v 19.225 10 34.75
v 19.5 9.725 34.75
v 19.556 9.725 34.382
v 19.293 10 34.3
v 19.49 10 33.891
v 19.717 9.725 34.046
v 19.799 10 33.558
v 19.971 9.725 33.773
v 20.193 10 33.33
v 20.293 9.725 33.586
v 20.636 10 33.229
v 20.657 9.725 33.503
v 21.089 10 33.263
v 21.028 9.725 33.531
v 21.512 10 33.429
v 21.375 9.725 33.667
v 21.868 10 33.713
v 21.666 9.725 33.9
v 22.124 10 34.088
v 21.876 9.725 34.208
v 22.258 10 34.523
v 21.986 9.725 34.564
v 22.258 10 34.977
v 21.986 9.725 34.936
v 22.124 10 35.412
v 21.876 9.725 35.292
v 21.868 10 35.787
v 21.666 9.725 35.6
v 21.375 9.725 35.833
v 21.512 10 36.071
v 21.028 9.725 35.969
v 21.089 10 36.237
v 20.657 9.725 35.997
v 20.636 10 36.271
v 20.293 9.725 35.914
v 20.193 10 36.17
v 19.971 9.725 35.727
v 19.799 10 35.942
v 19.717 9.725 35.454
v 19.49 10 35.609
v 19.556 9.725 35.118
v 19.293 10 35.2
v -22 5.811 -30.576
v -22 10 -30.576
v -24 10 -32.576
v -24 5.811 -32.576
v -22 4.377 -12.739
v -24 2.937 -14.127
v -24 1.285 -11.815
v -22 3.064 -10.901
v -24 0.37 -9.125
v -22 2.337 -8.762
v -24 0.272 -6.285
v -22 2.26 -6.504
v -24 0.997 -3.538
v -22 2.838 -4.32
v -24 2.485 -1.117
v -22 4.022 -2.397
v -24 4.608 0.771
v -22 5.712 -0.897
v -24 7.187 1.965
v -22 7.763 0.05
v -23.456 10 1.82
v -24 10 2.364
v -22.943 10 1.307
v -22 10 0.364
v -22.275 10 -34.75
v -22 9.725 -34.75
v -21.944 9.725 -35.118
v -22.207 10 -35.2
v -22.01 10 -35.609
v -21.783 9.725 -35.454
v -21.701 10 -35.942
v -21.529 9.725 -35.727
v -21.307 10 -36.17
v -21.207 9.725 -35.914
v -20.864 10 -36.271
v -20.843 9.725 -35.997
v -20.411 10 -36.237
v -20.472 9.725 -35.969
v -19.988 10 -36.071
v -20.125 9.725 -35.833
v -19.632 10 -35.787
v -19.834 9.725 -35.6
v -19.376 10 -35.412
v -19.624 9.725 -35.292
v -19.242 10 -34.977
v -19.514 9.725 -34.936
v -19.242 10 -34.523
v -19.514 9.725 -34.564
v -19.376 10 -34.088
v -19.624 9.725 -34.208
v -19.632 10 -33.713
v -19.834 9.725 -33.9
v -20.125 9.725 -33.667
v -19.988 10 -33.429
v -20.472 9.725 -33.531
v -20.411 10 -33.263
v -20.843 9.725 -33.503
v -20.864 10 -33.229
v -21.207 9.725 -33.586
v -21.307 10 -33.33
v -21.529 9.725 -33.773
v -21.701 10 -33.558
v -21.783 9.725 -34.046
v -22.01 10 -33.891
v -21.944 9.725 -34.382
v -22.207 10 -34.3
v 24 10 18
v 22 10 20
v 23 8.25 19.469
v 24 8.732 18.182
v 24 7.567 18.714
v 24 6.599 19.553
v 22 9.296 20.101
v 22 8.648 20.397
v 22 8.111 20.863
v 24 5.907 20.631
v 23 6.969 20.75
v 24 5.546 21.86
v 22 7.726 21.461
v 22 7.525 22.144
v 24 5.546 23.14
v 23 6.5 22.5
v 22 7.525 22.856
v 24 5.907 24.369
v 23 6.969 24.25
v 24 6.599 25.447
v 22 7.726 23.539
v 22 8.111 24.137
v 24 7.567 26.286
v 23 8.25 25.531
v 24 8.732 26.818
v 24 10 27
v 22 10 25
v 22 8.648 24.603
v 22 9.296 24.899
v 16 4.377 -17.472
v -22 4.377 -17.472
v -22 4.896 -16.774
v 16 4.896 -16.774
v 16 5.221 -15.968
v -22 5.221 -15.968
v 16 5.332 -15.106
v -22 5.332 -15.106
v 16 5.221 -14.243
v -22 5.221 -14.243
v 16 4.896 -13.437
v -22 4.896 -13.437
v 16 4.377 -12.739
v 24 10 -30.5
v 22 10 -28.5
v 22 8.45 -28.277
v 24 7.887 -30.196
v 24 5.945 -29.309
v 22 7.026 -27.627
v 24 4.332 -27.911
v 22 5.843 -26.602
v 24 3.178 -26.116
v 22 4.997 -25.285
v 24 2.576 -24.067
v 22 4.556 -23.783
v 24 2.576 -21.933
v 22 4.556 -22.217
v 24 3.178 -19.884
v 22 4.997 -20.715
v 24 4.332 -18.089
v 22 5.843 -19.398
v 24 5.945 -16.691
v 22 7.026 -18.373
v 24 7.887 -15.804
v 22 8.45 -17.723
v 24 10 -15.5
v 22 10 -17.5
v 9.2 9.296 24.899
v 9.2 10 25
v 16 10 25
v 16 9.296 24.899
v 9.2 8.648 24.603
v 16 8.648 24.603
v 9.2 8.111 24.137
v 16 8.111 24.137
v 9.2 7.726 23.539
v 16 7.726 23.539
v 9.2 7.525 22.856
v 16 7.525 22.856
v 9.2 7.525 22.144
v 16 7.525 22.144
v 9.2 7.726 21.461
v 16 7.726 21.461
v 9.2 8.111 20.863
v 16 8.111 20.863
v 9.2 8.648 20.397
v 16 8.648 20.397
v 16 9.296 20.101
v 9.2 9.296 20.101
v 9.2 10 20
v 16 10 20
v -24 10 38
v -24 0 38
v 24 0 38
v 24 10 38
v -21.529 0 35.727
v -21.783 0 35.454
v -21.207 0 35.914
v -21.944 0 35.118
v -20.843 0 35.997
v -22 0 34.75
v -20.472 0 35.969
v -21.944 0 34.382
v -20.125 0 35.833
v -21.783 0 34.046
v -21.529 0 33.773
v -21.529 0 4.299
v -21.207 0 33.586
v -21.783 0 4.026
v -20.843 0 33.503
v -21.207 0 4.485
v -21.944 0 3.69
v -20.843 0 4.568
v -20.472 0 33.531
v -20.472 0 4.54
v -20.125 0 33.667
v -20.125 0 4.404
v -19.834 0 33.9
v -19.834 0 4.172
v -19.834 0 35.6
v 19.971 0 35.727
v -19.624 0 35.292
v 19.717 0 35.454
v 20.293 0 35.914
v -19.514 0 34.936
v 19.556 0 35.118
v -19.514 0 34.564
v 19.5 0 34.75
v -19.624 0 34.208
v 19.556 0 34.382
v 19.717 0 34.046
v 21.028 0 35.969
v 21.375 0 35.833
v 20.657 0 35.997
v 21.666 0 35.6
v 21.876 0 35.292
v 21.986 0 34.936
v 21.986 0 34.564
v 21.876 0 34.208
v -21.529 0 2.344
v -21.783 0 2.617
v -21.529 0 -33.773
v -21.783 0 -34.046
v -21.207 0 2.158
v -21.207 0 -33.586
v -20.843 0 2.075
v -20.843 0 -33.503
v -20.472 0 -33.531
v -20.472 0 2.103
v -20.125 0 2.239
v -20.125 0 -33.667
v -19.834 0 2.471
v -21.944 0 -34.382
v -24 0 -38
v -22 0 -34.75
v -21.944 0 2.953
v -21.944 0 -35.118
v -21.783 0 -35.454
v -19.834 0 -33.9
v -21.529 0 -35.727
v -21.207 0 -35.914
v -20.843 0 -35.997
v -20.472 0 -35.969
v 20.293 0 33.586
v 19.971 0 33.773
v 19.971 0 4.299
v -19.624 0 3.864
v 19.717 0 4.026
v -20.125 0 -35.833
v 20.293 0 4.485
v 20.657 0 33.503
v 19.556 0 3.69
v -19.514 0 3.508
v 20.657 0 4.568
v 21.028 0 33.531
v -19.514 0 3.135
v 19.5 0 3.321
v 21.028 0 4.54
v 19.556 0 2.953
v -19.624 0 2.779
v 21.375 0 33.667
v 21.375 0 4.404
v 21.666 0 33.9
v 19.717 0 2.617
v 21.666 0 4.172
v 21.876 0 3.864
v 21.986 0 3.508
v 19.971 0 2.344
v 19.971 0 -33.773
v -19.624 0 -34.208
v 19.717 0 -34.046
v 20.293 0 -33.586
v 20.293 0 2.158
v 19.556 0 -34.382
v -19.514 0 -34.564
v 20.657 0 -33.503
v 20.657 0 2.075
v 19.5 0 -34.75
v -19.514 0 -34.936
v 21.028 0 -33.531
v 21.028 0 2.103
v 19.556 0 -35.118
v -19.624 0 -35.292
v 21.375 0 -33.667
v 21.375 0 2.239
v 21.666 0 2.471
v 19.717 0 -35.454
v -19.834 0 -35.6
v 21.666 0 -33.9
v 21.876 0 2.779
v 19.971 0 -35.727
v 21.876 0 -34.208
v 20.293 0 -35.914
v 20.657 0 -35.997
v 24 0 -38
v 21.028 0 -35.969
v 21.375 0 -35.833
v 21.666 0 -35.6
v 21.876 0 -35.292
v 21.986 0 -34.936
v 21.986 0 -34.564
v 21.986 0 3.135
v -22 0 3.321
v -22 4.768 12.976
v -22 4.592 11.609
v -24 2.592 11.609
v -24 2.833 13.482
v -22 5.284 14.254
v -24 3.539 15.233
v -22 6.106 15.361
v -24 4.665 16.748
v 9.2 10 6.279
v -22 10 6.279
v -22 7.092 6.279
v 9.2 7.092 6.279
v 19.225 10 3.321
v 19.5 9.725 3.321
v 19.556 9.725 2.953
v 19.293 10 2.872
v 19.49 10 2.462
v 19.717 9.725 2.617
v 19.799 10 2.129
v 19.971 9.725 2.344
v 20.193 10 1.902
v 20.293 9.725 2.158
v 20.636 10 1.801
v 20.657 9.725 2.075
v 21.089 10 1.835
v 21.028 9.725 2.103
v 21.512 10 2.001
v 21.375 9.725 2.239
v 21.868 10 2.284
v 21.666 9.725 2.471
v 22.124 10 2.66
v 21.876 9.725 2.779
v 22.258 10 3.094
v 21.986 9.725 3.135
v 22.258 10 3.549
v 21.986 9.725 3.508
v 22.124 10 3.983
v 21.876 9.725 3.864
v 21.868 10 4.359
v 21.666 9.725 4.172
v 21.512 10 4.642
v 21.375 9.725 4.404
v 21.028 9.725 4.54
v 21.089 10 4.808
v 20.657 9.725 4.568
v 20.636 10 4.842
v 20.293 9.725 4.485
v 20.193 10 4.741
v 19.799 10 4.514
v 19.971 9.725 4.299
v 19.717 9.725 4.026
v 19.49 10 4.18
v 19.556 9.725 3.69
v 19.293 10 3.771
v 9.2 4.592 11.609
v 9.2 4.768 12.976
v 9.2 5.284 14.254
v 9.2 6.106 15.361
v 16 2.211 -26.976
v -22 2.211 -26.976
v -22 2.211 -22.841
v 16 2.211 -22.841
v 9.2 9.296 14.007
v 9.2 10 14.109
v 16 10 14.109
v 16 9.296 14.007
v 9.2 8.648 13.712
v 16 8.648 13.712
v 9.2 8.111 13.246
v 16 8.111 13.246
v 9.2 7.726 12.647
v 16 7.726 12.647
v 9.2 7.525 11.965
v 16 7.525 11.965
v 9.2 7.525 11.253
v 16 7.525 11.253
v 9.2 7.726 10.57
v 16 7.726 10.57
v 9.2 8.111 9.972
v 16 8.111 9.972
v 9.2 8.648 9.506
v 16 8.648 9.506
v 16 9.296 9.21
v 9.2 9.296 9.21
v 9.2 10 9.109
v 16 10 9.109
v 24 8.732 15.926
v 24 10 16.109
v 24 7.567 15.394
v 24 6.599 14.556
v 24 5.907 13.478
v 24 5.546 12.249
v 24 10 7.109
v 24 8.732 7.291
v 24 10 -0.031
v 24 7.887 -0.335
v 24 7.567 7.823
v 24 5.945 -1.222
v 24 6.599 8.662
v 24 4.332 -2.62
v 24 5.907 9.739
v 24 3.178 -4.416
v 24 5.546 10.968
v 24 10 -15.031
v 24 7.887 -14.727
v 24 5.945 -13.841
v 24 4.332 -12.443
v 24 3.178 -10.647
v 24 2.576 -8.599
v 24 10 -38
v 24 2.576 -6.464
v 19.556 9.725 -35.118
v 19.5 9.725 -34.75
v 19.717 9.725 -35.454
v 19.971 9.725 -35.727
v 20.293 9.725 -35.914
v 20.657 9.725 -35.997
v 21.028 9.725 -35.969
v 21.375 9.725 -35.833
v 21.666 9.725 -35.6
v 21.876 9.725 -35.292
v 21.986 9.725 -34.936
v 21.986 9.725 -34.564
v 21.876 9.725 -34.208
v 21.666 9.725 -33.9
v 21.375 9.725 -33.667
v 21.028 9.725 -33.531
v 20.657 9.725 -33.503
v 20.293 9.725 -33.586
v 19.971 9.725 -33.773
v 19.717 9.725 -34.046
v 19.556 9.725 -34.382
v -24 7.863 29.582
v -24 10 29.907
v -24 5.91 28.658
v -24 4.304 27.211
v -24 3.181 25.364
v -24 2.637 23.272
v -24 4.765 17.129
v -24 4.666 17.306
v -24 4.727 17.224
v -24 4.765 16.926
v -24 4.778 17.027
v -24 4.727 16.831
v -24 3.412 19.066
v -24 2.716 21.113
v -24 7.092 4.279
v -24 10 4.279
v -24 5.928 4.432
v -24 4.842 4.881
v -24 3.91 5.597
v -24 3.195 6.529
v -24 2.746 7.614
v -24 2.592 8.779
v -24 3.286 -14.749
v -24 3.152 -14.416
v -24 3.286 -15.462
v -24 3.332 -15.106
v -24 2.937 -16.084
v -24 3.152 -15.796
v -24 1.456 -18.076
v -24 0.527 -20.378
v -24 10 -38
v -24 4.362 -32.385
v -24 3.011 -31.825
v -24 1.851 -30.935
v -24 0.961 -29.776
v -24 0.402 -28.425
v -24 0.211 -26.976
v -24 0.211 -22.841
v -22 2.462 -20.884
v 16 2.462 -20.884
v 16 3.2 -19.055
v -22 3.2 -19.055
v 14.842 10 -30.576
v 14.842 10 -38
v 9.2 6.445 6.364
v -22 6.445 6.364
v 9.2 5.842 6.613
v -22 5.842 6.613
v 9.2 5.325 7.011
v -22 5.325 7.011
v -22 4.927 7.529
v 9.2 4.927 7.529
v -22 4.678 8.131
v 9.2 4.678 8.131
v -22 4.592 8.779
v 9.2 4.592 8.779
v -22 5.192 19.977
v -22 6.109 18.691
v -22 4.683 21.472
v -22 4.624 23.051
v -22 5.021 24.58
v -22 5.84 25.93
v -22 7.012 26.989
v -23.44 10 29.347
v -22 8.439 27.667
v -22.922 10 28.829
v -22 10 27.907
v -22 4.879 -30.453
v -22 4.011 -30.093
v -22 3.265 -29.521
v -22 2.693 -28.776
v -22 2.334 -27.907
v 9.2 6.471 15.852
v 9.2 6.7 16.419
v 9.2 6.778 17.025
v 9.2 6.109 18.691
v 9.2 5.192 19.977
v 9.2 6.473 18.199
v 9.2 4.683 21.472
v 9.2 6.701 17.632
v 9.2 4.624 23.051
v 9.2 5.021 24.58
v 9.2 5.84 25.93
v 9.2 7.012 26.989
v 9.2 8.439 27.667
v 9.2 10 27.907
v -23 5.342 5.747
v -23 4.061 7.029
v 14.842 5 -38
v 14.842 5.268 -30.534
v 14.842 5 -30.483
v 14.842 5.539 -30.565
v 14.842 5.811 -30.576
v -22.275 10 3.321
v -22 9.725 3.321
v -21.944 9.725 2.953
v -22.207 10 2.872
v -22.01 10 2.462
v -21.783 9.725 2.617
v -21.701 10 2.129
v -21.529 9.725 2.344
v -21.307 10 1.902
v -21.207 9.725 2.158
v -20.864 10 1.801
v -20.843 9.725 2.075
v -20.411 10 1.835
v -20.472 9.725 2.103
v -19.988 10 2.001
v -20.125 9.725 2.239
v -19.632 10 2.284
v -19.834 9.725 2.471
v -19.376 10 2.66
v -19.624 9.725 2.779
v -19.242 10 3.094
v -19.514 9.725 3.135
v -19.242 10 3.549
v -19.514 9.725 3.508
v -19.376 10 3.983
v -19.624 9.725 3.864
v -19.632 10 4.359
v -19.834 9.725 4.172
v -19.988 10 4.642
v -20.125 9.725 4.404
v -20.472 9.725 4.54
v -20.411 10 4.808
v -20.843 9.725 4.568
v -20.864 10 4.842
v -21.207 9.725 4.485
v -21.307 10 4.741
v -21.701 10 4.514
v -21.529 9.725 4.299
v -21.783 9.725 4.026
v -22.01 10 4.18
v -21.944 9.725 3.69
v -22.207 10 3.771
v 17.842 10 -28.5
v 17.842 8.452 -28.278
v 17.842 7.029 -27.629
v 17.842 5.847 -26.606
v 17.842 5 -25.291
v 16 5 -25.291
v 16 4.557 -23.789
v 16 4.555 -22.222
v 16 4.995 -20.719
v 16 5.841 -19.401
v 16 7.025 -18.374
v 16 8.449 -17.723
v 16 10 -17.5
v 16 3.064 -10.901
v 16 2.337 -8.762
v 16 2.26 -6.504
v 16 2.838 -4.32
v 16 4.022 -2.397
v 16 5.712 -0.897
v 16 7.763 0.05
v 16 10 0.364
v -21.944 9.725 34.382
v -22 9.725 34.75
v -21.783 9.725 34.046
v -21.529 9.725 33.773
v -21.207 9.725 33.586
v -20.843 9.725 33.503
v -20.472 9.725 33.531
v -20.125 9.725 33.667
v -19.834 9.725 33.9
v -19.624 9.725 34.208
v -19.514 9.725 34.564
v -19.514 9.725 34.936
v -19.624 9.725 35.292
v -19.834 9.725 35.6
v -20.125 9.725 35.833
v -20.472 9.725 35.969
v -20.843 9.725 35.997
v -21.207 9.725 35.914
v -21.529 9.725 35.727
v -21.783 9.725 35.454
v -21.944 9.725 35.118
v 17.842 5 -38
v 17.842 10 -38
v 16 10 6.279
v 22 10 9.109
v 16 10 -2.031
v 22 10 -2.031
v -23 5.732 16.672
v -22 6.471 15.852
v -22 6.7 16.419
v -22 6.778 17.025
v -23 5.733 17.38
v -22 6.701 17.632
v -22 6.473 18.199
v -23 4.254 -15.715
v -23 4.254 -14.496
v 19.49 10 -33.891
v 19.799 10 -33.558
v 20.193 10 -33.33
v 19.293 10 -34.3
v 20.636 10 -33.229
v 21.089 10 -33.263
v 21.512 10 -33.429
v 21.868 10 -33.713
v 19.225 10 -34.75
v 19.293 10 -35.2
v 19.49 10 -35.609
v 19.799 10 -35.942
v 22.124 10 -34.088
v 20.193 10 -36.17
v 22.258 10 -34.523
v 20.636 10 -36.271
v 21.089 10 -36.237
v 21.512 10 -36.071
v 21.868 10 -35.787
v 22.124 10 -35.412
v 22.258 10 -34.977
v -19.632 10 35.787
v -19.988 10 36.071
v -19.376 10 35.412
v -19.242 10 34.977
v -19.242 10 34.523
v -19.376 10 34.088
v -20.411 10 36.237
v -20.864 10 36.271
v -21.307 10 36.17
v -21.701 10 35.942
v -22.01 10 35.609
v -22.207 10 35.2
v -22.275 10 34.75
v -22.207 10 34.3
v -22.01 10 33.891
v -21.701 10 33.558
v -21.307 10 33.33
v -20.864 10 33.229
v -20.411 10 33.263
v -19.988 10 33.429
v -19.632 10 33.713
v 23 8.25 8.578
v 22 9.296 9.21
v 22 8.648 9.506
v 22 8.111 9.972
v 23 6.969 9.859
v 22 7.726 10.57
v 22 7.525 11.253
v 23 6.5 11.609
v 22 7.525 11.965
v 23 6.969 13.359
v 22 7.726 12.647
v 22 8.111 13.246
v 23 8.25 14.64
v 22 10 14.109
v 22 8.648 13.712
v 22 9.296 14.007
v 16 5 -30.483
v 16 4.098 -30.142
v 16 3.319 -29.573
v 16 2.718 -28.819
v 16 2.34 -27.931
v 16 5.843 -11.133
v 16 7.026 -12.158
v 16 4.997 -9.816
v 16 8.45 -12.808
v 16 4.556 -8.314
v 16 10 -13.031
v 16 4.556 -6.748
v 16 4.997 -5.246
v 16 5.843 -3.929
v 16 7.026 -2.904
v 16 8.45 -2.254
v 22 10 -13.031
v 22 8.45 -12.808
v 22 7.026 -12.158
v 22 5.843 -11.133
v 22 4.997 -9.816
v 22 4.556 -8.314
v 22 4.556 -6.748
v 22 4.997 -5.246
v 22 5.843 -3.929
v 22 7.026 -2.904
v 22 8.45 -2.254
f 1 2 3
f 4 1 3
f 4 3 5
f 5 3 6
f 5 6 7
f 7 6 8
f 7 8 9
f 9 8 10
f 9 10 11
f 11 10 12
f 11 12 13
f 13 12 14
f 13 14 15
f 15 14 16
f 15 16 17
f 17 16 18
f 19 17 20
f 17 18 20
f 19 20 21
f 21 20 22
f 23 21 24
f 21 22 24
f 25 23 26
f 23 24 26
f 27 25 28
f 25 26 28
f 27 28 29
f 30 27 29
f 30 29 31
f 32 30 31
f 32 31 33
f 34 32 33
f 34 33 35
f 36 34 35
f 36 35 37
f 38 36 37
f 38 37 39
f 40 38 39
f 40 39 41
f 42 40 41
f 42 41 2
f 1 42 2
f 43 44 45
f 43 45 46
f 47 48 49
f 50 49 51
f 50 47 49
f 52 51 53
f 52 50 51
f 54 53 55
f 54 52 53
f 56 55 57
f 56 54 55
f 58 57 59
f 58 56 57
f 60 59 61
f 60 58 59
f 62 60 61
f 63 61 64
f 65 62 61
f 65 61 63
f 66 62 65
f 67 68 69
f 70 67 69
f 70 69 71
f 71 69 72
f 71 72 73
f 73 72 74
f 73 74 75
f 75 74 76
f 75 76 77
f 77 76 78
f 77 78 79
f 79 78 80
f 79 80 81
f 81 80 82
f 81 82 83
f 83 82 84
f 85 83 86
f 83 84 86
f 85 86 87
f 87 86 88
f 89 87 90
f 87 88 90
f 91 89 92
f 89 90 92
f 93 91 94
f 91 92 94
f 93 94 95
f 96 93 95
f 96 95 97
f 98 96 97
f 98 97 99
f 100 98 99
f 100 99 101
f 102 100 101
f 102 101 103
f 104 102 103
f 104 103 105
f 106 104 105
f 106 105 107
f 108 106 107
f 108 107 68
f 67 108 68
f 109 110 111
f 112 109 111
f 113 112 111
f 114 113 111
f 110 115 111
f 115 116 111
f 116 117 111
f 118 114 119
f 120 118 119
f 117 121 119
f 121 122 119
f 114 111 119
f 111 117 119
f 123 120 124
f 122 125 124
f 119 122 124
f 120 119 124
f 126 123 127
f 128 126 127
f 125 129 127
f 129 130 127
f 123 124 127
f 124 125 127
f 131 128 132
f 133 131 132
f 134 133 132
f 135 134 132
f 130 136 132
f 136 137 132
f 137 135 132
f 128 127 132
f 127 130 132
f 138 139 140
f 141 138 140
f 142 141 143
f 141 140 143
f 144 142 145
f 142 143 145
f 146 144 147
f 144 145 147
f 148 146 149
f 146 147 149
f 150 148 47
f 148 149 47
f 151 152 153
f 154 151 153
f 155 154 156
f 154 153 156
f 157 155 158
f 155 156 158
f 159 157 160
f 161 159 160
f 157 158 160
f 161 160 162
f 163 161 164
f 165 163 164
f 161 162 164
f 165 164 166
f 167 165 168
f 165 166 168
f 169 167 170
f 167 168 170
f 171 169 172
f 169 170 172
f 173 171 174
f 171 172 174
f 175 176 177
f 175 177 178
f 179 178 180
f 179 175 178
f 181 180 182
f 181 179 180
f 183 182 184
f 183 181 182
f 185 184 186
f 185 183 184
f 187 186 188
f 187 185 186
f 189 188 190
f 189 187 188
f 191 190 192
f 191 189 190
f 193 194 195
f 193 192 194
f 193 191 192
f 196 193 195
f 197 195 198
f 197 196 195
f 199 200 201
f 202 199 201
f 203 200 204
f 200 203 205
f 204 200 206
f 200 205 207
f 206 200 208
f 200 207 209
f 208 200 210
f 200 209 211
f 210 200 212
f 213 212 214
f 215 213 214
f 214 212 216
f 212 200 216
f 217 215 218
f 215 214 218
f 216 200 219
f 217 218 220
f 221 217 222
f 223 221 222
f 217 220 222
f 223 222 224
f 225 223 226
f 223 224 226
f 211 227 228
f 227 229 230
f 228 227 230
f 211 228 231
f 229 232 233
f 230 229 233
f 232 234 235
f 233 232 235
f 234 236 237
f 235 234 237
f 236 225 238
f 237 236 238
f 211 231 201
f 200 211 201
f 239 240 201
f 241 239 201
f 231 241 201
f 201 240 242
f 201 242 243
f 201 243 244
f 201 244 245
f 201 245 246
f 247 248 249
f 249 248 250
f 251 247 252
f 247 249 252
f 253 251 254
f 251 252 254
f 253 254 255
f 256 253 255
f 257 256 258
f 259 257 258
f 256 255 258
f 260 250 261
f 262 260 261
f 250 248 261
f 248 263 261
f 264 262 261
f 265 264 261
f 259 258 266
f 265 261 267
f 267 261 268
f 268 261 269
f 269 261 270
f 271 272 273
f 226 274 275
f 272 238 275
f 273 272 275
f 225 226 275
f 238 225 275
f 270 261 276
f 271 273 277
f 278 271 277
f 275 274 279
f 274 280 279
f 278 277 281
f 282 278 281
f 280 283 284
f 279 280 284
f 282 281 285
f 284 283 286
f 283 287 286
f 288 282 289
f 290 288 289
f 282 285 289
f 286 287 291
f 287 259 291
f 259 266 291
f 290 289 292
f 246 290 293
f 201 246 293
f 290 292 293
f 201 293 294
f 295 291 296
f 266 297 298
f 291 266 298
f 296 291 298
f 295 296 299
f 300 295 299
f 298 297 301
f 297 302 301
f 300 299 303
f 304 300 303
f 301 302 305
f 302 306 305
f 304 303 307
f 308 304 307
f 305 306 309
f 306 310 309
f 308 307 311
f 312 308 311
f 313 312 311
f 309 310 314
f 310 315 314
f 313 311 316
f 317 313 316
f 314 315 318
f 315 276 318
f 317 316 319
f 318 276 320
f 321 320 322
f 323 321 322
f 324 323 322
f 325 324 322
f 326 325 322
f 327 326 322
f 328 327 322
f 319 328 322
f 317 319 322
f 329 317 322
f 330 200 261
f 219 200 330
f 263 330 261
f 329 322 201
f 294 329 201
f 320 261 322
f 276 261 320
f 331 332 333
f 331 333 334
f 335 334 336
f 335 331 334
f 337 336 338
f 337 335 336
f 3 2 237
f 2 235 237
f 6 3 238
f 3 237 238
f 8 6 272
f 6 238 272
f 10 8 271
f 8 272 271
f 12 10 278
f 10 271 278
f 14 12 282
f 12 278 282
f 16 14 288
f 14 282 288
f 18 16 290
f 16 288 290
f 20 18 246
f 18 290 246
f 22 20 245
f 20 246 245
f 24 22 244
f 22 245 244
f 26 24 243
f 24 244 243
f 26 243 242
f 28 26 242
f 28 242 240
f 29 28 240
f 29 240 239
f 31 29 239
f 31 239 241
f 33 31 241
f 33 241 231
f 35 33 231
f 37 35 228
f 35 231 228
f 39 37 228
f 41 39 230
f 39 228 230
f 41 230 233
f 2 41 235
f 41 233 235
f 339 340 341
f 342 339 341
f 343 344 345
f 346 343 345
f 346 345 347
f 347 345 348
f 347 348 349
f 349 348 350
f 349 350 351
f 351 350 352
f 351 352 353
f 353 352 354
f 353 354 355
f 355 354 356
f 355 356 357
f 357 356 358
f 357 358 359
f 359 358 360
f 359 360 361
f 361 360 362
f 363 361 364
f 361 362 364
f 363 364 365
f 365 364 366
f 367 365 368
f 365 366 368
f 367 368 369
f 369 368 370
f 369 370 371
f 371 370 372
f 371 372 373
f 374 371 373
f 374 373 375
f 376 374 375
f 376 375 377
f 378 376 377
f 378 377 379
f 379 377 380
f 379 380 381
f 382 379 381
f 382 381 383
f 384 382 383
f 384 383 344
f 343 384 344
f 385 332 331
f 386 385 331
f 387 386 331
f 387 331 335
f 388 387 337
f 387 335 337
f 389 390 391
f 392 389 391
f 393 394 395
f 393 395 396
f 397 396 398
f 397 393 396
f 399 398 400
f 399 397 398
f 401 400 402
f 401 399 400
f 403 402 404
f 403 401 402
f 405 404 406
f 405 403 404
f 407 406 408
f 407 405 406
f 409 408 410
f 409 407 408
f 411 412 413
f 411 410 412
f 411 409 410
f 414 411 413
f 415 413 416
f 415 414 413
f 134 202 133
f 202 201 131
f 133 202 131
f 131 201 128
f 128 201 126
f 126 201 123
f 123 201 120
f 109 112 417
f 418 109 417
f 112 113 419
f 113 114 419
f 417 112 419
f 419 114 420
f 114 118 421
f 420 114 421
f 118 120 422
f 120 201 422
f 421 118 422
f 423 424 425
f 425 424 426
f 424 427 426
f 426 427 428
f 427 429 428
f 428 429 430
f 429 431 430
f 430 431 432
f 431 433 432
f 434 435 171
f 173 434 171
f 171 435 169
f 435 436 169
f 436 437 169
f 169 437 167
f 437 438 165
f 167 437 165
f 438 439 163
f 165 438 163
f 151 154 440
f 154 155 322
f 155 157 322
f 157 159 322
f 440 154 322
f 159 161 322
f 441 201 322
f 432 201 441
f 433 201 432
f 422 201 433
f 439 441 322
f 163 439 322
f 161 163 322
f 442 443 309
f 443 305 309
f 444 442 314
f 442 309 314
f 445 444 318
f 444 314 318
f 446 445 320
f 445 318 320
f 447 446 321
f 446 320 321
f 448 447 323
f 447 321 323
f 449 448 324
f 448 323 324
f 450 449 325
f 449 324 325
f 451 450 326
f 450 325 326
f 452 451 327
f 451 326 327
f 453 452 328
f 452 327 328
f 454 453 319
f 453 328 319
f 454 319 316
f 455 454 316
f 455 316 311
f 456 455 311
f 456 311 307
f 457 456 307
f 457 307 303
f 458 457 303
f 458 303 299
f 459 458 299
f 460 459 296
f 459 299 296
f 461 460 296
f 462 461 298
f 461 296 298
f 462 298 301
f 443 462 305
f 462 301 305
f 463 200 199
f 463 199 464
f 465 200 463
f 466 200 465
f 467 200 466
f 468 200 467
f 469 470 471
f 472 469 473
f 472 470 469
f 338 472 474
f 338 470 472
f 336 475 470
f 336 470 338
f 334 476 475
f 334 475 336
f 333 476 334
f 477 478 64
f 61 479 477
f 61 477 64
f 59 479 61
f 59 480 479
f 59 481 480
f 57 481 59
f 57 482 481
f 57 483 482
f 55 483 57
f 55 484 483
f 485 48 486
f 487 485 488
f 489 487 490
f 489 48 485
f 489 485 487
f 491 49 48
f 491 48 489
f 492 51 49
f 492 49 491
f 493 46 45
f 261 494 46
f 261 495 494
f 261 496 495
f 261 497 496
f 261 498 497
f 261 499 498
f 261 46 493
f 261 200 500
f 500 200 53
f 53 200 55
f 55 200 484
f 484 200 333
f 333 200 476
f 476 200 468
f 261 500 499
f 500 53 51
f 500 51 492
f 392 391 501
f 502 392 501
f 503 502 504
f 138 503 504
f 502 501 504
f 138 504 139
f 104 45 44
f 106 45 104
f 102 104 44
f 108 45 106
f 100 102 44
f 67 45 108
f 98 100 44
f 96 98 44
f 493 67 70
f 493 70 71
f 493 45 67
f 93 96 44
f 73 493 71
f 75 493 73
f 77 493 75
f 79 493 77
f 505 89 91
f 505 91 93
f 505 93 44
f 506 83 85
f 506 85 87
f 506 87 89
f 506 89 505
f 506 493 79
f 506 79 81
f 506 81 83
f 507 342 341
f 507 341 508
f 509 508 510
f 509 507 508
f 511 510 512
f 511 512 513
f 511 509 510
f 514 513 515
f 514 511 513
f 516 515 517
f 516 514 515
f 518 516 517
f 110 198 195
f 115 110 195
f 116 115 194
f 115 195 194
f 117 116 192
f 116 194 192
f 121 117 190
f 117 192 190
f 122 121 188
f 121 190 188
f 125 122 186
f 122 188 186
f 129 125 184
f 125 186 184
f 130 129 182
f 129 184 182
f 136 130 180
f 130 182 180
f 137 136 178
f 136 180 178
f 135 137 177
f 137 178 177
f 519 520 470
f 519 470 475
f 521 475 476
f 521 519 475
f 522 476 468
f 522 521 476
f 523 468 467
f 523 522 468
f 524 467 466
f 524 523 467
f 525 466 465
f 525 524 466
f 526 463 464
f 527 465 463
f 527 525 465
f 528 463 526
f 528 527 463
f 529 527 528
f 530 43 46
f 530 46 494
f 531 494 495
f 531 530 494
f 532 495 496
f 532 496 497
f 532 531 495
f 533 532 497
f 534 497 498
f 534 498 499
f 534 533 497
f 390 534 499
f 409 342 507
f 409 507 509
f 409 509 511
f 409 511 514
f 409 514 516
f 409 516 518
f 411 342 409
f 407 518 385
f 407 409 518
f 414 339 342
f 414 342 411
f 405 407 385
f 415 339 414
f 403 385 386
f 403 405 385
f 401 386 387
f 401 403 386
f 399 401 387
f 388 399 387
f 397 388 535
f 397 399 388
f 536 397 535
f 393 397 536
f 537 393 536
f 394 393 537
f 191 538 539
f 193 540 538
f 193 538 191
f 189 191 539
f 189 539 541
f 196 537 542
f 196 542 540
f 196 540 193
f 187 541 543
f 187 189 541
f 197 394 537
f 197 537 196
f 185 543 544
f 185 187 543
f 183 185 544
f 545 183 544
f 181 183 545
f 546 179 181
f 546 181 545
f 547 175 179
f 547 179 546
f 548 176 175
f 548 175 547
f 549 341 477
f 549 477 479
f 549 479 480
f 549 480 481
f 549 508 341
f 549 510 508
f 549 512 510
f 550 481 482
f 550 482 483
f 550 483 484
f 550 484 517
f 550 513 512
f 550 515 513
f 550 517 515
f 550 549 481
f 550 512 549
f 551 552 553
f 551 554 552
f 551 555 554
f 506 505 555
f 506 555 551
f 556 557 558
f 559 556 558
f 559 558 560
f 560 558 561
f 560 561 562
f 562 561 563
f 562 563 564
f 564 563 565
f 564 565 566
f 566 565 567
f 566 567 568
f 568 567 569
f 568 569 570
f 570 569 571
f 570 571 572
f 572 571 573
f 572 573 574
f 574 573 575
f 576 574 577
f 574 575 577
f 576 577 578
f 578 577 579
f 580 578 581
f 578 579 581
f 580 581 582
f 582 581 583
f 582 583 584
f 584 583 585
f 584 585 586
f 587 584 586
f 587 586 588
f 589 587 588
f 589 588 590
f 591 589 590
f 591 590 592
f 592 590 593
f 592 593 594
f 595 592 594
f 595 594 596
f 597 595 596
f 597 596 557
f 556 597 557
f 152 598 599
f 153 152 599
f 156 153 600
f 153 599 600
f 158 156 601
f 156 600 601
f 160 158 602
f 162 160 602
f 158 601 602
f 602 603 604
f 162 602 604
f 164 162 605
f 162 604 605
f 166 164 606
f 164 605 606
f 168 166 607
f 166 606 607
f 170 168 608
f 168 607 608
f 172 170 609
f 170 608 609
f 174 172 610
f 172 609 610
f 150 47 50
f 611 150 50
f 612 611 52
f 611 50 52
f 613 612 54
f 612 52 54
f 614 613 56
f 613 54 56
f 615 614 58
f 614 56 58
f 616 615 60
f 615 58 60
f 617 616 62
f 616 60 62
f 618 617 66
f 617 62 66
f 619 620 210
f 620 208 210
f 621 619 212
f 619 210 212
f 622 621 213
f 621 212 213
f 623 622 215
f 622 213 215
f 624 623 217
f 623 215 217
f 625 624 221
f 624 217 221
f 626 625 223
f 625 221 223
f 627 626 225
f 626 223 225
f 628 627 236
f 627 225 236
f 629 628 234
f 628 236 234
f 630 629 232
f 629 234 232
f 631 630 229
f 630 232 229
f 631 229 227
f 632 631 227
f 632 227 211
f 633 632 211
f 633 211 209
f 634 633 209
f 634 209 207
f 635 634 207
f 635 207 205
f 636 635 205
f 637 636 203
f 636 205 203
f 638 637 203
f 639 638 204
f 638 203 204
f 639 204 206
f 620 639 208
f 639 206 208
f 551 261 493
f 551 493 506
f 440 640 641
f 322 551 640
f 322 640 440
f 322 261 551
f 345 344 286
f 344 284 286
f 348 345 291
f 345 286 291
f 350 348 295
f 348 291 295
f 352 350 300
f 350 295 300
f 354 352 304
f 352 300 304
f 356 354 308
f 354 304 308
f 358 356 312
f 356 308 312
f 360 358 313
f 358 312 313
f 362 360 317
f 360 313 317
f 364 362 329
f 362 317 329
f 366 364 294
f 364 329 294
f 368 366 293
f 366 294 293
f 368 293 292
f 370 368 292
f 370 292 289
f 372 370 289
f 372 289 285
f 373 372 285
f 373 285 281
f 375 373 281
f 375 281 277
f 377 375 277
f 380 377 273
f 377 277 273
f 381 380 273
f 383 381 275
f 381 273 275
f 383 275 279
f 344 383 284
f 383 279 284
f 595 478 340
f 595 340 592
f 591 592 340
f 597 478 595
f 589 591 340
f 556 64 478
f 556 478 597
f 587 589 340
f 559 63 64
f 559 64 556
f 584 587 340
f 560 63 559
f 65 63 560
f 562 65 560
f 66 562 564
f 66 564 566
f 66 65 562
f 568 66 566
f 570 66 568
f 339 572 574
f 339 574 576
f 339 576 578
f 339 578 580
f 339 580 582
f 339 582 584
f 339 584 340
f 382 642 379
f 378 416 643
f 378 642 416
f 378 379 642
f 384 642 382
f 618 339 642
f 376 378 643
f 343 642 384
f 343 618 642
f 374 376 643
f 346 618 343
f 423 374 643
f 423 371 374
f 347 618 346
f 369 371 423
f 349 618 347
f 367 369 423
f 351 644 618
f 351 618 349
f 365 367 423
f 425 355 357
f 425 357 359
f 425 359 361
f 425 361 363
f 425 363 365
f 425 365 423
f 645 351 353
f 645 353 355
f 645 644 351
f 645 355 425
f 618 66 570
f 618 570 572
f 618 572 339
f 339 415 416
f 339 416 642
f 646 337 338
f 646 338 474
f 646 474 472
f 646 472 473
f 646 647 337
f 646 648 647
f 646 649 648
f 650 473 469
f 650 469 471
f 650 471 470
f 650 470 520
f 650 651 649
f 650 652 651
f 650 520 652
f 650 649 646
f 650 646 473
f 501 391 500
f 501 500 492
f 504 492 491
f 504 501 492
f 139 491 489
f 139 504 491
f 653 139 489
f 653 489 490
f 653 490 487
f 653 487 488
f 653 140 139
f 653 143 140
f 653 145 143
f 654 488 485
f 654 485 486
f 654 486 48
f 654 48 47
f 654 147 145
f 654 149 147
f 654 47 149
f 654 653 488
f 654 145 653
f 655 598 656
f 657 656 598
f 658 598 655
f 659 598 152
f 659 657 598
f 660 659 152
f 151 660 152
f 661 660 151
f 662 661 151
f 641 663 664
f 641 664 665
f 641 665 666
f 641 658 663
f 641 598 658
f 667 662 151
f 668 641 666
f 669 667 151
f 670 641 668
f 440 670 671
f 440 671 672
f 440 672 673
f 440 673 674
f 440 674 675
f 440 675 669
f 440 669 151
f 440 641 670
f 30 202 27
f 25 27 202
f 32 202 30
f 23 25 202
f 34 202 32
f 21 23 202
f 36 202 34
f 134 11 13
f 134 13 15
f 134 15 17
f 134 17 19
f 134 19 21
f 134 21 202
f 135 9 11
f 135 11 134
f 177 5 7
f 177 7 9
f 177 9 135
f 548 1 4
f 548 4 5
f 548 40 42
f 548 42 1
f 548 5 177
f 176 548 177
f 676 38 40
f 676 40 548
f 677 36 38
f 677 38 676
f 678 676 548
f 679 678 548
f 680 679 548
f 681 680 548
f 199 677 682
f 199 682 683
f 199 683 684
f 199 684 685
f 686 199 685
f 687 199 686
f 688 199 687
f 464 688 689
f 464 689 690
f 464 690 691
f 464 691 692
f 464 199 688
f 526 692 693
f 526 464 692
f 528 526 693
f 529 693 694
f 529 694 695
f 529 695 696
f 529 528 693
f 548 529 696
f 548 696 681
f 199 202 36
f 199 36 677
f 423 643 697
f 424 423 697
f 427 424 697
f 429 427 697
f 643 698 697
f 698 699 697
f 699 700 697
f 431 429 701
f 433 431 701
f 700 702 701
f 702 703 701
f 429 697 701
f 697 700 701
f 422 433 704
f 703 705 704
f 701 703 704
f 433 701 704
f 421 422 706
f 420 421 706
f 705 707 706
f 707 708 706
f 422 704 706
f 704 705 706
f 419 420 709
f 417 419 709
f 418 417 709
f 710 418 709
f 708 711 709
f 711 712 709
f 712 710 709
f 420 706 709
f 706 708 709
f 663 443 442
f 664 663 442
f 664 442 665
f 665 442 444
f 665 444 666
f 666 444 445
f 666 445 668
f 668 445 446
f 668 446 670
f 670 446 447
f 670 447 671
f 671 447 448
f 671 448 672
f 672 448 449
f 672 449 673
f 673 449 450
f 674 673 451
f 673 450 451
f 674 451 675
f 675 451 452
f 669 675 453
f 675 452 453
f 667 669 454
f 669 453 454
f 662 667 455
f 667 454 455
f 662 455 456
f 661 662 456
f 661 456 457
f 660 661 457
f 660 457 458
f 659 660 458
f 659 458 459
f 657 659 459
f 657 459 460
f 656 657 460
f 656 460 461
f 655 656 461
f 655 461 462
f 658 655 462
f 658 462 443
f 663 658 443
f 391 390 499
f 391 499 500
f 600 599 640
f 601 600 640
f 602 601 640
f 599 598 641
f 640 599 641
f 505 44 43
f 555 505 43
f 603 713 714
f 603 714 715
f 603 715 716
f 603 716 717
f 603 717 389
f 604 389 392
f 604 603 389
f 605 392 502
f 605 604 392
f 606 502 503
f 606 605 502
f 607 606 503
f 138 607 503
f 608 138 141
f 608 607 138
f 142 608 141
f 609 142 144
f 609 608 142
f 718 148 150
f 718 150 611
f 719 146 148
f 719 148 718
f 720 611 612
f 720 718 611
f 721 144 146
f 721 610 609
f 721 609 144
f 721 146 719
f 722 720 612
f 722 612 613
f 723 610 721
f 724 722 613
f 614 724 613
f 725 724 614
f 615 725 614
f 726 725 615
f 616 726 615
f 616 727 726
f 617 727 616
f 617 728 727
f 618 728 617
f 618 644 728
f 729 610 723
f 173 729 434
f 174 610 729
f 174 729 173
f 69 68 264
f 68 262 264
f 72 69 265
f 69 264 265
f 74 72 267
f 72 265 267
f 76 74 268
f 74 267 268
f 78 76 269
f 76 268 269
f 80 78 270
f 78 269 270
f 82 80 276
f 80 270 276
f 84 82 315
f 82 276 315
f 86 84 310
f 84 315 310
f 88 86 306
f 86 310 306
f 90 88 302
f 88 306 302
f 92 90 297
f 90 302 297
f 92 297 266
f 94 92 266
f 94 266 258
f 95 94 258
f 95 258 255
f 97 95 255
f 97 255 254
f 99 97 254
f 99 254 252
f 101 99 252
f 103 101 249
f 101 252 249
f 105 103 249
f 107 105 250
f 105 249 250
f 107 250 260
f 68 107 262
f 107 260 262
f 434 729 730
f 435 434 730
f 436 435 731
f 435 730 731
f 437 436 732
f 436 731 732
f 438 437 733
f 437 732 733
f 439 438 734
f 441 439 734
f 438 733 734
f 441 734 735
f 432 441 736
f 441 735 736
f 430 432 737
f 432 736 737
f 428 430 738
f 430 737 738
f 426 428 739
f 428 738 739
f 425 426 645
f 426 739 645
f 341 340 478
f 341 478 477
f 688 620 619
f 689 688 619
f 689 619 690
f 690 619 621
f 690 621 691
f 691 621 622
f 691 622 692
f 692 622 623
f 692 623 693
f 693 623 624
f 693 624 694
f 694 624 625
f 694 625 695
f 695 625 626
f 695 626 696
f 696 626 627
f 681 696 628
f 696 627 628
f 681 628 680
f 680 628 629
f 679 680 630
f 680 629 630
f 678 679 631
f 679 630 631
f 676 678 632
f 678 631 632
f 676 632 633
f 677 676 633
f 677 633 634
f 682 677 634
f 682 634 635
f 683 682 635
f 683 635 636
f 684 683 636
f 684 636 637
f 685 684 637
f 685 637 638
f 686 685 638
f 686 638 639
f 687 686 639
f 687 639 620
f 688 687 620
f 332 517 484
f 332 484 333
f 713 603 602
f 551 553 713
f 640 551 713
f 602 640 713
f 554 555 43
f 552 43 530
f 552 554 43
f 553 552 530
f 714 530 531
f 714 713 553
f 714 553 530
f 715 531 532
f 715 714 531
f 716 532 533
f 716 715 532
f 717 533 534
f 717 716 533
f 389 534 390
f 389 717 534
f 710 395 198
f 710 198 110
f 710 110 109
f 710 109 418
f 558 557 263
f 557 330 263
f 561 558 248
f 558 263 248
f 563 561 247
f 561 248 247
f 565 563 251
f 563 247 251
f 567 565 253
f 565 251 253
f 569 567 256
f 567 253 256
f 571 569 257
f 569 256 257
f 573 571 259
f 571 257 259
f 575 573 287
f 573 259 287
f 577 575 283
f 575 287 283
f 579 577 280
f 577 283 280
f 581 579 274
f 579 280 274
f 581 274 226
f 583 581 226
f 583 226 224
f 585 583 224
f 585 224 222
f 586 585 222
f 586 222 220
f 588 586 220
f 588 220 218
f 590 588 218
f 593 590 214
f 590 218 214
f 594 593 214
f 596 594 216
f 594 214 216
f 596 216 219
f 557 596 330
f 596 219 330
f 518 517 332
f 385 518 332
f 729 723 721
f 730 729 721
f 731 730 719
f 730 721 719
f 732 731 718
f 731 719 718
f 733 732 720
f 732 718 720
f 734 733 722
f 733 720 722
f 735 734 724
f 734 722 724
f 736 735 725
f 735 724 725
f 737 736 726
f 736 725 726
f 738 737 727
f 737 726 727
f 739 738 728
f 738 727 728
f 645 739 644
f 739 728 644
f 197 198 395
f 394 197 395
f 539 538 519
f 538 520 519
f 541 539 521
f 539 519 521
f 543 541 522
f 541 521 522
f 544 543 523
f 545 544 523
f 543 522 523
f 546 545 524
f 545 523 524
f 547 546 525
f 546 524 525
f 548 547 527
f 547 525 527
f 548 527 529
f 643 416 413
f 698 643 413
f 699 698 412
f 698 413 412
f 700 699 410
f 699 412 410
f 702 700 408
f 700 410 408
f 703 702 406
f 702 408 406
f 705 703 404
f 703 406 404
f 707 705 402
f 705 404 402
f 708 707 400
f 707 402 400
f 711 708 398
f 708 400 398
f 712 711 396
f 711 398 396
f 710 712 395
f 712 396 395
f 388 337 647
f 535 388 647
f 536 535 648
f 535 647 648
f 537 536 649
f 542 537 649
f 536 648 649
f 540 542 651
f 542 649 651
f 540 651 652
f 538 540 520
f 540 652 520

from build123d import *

# Parameters (mm, degrees)
SKETCH1_W                   = 48
SKETCH1_H                   = 76
BOSS_EXTRUDE1_DEPTH         = 10
SKETCH2_R                   = 5.5
SKETCH2_R_2                 = 2.5
CUT_EXTRUDE1_DEPTH          = 63.032249677
CUT_EXTRUDE2_DEPTH          = 40
FILLET1_R                   = 3.6
FILLET2_R                   = 2.5
M3_TAPPED_HOLE1_D           = 2.5
M3_TAPPED_HOLE1_CSINK_D     = 3.05
M3_TAPPED_HOLE1_CSINK_ANGLE = 90
CHAMFER1_SIZE               = 2
BOSS_EXTRUDE2_START         = 6.8
BOSS_EXTRUDE2_DEPTH         = 6.8
CHAMFER2_SIZE               = 2
SKETCH7_W                   = 3
SKETCH7_H                   = 18.523335373
CUT_EXTRUDE3_DEPTH          = 5


with BuildPart() as part:
    # Sketch1 → Boss-Extrude1 (new body)
    with BuildSketch(Plane(origin=(0, 0, 0), x_dir=(1, 0, 0), z_dir=(0, 1, 0))):
        Rectangle(SKETCH1_W, SKETCH1_H)
    extrude(amount=BOSS_EXTRUDE1_DEPTH)

    # Sketch2 → Cut-Extrude1 (cut, through all)
    with BuildSketch(Plane.ZY.offset(24)):
        with Locations((-23, 10)):
            Circle(SKETCH2_R)
        with Locations((-7.531152857, 10)):
            Circle(SKETCH2_R)
        with Locations((11.608764346, 10)):
            Circle(SKETCH2_R_2)
        with Locations((22.5, 10)):
            Circle(SKETCH2_R_2)
    extrude(amount=-CUT_EXTRUDE1_DEPTH, mode=Mode.SUBTRACT)

    # Sketch3 → Cut-Extrude2 (cut)
    with BuildSketch(Plane.ZY.offset(24)):
        with BuildLine():
            Line((-30.575601228, 16.807330276), (-30.575601228, 2.210930276))
            Line((-30.575601228, 2.210930276), (-22.840601228, 2.210930276))
            ThreePointArc((-22.840601228, 2.210930276), (-19.946134653, 2.772905234), (-17.472254435, 4.377171194))
            ThreePointArc((-17.472254435, 4.377171194), (-15.105601228, 5.332165574), (-12.73894802, 4.377171194))
            ThreePointArc((-12.73894802, 4.377171194), (0.284776113, 8.838942121), (-10.941513582, 16.807330276))
            Line((-10.941513582, 16.807330276), (-30.575601228, 16.807330276))
        make_face()
        with BuildLine():
            Line((6.278500547, 18.195630094), (6.278500547, 4.592448506))
            Line((6.278500547, 4.592448506), (11.608764346, 4.592448506))
            ThreePointArc((11.608764346, 4.592448506), (13.631545875, 4.985025618), (15.360627849, 6.105756374))
            ThreePointArc((15.360627849, 6.105756374), (17.025161235, 6.778090853), (18.691008119, 6.109017464))
            ThreePointArc((18.691008119, 6.109017464), (27.812192286, 11.050917016), (17.515830977, 12.317137997))
            Line((17.515830977, 12.317137997), (6.278500547, 18.195630094))
        make_face()
    extrude(amount=-CUT_EXTRUDE2_DEPTH, mode=Mode.SUBTRACT)

    # Fillet1
    fillet1_edges = [part.edges().sort_by_distance(p)[0] for p in [
        (-4, 2.210930276, -30.575601228),
    ]]
    fillet(fillet1_edges, radius=FILLET1_R)

    # Fillet2
    fillet2_edges = [part.edges().sort_by_distance(p)[0] for p in [
        (-4, 4.592448506, 6.278500547),
    ]]
    fillet(fillet2_edges, radius=FILLET2_R)

    # M3 Tapped Hole1 (through all)
    with Locations(Plane(origin=(0, 10, 0), x_dir=(1, 0, 0), z_dir=(0, 1, 0))):
        with Locations((-20.75, 34.75), (20.75, 34.75), (20.75, -3.321355168), (-20.75, -3.321355168), (-20.75, -34.75), (20.75, -34.75)):
            CounterSinkHole(M3_TAPPED_HOLE1_D / 2, M3_TAPPED_HOLE1_CSINK_D / 2, counter_sink_angle=M3_TAPPED_HOLE1_CSINK_ANGLE)

    # Chamfer1
    chamfer1_edges = [part.edges().sort_by_distance(p)[0] for p in [
        (-24, 2.210930276, -24.908101228),
        (-24, 3.265345864, -29.52118564),
        (-24, 4.592448506, 10.193632446),
        (-24, 5.324681553, 7.010733594),
        (-24, 7.905465138, -30.575601228),
        (-24, 2.772905234, -19.946134653),
        (-24, 5.332165574, -15.105601228),
        (-24, 2.837756402, -4.320340718),
        (-24, 8.546224253, 6.278500547),
        (-24, 4.985025618, 13.631545875),
        (-24, 6.778090853, 17.025161235),
        (-24, 5.021244944, 24.57967394),
    ]]
    chamfer(chamfer1_edges, length=CHAMFER1_SIZE)

    # Sketch6 → Boss-Extrude2 (add)
    with BuildSketch(Plane.ZY.offset(-16).offset(BOSS_EXTRUDE2_START)):
        with BuildLine():
            Line((6.278500547, 10), (6.278500547, 7.092448506))
            ThreePointArc((6.278500547, 7.092448506), (7.010733594, 5.324681553), (8.778500547, 4.592448506))
            Line((8.778500547, 4.592448506), (11.608764346, 4.592448506))
            ThreePointArc((11.608764346, 4.592448506), (13.631545875, 4.985025618), (15.360627849, 6.105756374))
            ThreePointArc((15.360627849, 6.105756374), (17.025161235, 6.778090853), (18.691008119, 6.109017464))
            ThreePointArc((18.691008119, 6.109017464), (24.57967394, 5.021244944), (27.907080182, 10))
            Line((27.907080182, 10), (25, 10))
            ThreePointArc((25, 10), (22.5, 7.5), (20, 10))
            Line((20, 10), (14.108764346, 10))
            ThreePointArc((14.108764346, 10), (11.608764346, 7.5), (9.108764346, 10))
            Line((9.108764346, 10), (6.278500547, 10))
        make_face()
    extrude(amount=-BOSS_EXTRUDE2_DEPTH)

    # Chamfer2
    chamfer2_edges = [part.edges().sort_by_distance(p)[0] for p in [
        (24, 4.5, -23),
        (24, 4.5, -7.531152857),
        (24, 7.5, 11.608764346),
        (24, 7.5, 22.5),
    ]]
    chamfer(chamfer2_edges, length=CHAMFER2_SIZE)

    # Sketch7 → Cut-Extrude3 (cut)
    with BuildSketch(Plane(origin=(0, 10, 0), x_dir=(1, 0, 0), z_dir=(0, 1, 0))):
        with Locations((16.34197527, 33.304071339)):
            Rectangle(SKETCH7_W, SKETCH7_H)
    extrude(amount=-CUT_EXTRUDE3_DEPTH, mode=Mode.SUBTRACT)


solid = part.part
